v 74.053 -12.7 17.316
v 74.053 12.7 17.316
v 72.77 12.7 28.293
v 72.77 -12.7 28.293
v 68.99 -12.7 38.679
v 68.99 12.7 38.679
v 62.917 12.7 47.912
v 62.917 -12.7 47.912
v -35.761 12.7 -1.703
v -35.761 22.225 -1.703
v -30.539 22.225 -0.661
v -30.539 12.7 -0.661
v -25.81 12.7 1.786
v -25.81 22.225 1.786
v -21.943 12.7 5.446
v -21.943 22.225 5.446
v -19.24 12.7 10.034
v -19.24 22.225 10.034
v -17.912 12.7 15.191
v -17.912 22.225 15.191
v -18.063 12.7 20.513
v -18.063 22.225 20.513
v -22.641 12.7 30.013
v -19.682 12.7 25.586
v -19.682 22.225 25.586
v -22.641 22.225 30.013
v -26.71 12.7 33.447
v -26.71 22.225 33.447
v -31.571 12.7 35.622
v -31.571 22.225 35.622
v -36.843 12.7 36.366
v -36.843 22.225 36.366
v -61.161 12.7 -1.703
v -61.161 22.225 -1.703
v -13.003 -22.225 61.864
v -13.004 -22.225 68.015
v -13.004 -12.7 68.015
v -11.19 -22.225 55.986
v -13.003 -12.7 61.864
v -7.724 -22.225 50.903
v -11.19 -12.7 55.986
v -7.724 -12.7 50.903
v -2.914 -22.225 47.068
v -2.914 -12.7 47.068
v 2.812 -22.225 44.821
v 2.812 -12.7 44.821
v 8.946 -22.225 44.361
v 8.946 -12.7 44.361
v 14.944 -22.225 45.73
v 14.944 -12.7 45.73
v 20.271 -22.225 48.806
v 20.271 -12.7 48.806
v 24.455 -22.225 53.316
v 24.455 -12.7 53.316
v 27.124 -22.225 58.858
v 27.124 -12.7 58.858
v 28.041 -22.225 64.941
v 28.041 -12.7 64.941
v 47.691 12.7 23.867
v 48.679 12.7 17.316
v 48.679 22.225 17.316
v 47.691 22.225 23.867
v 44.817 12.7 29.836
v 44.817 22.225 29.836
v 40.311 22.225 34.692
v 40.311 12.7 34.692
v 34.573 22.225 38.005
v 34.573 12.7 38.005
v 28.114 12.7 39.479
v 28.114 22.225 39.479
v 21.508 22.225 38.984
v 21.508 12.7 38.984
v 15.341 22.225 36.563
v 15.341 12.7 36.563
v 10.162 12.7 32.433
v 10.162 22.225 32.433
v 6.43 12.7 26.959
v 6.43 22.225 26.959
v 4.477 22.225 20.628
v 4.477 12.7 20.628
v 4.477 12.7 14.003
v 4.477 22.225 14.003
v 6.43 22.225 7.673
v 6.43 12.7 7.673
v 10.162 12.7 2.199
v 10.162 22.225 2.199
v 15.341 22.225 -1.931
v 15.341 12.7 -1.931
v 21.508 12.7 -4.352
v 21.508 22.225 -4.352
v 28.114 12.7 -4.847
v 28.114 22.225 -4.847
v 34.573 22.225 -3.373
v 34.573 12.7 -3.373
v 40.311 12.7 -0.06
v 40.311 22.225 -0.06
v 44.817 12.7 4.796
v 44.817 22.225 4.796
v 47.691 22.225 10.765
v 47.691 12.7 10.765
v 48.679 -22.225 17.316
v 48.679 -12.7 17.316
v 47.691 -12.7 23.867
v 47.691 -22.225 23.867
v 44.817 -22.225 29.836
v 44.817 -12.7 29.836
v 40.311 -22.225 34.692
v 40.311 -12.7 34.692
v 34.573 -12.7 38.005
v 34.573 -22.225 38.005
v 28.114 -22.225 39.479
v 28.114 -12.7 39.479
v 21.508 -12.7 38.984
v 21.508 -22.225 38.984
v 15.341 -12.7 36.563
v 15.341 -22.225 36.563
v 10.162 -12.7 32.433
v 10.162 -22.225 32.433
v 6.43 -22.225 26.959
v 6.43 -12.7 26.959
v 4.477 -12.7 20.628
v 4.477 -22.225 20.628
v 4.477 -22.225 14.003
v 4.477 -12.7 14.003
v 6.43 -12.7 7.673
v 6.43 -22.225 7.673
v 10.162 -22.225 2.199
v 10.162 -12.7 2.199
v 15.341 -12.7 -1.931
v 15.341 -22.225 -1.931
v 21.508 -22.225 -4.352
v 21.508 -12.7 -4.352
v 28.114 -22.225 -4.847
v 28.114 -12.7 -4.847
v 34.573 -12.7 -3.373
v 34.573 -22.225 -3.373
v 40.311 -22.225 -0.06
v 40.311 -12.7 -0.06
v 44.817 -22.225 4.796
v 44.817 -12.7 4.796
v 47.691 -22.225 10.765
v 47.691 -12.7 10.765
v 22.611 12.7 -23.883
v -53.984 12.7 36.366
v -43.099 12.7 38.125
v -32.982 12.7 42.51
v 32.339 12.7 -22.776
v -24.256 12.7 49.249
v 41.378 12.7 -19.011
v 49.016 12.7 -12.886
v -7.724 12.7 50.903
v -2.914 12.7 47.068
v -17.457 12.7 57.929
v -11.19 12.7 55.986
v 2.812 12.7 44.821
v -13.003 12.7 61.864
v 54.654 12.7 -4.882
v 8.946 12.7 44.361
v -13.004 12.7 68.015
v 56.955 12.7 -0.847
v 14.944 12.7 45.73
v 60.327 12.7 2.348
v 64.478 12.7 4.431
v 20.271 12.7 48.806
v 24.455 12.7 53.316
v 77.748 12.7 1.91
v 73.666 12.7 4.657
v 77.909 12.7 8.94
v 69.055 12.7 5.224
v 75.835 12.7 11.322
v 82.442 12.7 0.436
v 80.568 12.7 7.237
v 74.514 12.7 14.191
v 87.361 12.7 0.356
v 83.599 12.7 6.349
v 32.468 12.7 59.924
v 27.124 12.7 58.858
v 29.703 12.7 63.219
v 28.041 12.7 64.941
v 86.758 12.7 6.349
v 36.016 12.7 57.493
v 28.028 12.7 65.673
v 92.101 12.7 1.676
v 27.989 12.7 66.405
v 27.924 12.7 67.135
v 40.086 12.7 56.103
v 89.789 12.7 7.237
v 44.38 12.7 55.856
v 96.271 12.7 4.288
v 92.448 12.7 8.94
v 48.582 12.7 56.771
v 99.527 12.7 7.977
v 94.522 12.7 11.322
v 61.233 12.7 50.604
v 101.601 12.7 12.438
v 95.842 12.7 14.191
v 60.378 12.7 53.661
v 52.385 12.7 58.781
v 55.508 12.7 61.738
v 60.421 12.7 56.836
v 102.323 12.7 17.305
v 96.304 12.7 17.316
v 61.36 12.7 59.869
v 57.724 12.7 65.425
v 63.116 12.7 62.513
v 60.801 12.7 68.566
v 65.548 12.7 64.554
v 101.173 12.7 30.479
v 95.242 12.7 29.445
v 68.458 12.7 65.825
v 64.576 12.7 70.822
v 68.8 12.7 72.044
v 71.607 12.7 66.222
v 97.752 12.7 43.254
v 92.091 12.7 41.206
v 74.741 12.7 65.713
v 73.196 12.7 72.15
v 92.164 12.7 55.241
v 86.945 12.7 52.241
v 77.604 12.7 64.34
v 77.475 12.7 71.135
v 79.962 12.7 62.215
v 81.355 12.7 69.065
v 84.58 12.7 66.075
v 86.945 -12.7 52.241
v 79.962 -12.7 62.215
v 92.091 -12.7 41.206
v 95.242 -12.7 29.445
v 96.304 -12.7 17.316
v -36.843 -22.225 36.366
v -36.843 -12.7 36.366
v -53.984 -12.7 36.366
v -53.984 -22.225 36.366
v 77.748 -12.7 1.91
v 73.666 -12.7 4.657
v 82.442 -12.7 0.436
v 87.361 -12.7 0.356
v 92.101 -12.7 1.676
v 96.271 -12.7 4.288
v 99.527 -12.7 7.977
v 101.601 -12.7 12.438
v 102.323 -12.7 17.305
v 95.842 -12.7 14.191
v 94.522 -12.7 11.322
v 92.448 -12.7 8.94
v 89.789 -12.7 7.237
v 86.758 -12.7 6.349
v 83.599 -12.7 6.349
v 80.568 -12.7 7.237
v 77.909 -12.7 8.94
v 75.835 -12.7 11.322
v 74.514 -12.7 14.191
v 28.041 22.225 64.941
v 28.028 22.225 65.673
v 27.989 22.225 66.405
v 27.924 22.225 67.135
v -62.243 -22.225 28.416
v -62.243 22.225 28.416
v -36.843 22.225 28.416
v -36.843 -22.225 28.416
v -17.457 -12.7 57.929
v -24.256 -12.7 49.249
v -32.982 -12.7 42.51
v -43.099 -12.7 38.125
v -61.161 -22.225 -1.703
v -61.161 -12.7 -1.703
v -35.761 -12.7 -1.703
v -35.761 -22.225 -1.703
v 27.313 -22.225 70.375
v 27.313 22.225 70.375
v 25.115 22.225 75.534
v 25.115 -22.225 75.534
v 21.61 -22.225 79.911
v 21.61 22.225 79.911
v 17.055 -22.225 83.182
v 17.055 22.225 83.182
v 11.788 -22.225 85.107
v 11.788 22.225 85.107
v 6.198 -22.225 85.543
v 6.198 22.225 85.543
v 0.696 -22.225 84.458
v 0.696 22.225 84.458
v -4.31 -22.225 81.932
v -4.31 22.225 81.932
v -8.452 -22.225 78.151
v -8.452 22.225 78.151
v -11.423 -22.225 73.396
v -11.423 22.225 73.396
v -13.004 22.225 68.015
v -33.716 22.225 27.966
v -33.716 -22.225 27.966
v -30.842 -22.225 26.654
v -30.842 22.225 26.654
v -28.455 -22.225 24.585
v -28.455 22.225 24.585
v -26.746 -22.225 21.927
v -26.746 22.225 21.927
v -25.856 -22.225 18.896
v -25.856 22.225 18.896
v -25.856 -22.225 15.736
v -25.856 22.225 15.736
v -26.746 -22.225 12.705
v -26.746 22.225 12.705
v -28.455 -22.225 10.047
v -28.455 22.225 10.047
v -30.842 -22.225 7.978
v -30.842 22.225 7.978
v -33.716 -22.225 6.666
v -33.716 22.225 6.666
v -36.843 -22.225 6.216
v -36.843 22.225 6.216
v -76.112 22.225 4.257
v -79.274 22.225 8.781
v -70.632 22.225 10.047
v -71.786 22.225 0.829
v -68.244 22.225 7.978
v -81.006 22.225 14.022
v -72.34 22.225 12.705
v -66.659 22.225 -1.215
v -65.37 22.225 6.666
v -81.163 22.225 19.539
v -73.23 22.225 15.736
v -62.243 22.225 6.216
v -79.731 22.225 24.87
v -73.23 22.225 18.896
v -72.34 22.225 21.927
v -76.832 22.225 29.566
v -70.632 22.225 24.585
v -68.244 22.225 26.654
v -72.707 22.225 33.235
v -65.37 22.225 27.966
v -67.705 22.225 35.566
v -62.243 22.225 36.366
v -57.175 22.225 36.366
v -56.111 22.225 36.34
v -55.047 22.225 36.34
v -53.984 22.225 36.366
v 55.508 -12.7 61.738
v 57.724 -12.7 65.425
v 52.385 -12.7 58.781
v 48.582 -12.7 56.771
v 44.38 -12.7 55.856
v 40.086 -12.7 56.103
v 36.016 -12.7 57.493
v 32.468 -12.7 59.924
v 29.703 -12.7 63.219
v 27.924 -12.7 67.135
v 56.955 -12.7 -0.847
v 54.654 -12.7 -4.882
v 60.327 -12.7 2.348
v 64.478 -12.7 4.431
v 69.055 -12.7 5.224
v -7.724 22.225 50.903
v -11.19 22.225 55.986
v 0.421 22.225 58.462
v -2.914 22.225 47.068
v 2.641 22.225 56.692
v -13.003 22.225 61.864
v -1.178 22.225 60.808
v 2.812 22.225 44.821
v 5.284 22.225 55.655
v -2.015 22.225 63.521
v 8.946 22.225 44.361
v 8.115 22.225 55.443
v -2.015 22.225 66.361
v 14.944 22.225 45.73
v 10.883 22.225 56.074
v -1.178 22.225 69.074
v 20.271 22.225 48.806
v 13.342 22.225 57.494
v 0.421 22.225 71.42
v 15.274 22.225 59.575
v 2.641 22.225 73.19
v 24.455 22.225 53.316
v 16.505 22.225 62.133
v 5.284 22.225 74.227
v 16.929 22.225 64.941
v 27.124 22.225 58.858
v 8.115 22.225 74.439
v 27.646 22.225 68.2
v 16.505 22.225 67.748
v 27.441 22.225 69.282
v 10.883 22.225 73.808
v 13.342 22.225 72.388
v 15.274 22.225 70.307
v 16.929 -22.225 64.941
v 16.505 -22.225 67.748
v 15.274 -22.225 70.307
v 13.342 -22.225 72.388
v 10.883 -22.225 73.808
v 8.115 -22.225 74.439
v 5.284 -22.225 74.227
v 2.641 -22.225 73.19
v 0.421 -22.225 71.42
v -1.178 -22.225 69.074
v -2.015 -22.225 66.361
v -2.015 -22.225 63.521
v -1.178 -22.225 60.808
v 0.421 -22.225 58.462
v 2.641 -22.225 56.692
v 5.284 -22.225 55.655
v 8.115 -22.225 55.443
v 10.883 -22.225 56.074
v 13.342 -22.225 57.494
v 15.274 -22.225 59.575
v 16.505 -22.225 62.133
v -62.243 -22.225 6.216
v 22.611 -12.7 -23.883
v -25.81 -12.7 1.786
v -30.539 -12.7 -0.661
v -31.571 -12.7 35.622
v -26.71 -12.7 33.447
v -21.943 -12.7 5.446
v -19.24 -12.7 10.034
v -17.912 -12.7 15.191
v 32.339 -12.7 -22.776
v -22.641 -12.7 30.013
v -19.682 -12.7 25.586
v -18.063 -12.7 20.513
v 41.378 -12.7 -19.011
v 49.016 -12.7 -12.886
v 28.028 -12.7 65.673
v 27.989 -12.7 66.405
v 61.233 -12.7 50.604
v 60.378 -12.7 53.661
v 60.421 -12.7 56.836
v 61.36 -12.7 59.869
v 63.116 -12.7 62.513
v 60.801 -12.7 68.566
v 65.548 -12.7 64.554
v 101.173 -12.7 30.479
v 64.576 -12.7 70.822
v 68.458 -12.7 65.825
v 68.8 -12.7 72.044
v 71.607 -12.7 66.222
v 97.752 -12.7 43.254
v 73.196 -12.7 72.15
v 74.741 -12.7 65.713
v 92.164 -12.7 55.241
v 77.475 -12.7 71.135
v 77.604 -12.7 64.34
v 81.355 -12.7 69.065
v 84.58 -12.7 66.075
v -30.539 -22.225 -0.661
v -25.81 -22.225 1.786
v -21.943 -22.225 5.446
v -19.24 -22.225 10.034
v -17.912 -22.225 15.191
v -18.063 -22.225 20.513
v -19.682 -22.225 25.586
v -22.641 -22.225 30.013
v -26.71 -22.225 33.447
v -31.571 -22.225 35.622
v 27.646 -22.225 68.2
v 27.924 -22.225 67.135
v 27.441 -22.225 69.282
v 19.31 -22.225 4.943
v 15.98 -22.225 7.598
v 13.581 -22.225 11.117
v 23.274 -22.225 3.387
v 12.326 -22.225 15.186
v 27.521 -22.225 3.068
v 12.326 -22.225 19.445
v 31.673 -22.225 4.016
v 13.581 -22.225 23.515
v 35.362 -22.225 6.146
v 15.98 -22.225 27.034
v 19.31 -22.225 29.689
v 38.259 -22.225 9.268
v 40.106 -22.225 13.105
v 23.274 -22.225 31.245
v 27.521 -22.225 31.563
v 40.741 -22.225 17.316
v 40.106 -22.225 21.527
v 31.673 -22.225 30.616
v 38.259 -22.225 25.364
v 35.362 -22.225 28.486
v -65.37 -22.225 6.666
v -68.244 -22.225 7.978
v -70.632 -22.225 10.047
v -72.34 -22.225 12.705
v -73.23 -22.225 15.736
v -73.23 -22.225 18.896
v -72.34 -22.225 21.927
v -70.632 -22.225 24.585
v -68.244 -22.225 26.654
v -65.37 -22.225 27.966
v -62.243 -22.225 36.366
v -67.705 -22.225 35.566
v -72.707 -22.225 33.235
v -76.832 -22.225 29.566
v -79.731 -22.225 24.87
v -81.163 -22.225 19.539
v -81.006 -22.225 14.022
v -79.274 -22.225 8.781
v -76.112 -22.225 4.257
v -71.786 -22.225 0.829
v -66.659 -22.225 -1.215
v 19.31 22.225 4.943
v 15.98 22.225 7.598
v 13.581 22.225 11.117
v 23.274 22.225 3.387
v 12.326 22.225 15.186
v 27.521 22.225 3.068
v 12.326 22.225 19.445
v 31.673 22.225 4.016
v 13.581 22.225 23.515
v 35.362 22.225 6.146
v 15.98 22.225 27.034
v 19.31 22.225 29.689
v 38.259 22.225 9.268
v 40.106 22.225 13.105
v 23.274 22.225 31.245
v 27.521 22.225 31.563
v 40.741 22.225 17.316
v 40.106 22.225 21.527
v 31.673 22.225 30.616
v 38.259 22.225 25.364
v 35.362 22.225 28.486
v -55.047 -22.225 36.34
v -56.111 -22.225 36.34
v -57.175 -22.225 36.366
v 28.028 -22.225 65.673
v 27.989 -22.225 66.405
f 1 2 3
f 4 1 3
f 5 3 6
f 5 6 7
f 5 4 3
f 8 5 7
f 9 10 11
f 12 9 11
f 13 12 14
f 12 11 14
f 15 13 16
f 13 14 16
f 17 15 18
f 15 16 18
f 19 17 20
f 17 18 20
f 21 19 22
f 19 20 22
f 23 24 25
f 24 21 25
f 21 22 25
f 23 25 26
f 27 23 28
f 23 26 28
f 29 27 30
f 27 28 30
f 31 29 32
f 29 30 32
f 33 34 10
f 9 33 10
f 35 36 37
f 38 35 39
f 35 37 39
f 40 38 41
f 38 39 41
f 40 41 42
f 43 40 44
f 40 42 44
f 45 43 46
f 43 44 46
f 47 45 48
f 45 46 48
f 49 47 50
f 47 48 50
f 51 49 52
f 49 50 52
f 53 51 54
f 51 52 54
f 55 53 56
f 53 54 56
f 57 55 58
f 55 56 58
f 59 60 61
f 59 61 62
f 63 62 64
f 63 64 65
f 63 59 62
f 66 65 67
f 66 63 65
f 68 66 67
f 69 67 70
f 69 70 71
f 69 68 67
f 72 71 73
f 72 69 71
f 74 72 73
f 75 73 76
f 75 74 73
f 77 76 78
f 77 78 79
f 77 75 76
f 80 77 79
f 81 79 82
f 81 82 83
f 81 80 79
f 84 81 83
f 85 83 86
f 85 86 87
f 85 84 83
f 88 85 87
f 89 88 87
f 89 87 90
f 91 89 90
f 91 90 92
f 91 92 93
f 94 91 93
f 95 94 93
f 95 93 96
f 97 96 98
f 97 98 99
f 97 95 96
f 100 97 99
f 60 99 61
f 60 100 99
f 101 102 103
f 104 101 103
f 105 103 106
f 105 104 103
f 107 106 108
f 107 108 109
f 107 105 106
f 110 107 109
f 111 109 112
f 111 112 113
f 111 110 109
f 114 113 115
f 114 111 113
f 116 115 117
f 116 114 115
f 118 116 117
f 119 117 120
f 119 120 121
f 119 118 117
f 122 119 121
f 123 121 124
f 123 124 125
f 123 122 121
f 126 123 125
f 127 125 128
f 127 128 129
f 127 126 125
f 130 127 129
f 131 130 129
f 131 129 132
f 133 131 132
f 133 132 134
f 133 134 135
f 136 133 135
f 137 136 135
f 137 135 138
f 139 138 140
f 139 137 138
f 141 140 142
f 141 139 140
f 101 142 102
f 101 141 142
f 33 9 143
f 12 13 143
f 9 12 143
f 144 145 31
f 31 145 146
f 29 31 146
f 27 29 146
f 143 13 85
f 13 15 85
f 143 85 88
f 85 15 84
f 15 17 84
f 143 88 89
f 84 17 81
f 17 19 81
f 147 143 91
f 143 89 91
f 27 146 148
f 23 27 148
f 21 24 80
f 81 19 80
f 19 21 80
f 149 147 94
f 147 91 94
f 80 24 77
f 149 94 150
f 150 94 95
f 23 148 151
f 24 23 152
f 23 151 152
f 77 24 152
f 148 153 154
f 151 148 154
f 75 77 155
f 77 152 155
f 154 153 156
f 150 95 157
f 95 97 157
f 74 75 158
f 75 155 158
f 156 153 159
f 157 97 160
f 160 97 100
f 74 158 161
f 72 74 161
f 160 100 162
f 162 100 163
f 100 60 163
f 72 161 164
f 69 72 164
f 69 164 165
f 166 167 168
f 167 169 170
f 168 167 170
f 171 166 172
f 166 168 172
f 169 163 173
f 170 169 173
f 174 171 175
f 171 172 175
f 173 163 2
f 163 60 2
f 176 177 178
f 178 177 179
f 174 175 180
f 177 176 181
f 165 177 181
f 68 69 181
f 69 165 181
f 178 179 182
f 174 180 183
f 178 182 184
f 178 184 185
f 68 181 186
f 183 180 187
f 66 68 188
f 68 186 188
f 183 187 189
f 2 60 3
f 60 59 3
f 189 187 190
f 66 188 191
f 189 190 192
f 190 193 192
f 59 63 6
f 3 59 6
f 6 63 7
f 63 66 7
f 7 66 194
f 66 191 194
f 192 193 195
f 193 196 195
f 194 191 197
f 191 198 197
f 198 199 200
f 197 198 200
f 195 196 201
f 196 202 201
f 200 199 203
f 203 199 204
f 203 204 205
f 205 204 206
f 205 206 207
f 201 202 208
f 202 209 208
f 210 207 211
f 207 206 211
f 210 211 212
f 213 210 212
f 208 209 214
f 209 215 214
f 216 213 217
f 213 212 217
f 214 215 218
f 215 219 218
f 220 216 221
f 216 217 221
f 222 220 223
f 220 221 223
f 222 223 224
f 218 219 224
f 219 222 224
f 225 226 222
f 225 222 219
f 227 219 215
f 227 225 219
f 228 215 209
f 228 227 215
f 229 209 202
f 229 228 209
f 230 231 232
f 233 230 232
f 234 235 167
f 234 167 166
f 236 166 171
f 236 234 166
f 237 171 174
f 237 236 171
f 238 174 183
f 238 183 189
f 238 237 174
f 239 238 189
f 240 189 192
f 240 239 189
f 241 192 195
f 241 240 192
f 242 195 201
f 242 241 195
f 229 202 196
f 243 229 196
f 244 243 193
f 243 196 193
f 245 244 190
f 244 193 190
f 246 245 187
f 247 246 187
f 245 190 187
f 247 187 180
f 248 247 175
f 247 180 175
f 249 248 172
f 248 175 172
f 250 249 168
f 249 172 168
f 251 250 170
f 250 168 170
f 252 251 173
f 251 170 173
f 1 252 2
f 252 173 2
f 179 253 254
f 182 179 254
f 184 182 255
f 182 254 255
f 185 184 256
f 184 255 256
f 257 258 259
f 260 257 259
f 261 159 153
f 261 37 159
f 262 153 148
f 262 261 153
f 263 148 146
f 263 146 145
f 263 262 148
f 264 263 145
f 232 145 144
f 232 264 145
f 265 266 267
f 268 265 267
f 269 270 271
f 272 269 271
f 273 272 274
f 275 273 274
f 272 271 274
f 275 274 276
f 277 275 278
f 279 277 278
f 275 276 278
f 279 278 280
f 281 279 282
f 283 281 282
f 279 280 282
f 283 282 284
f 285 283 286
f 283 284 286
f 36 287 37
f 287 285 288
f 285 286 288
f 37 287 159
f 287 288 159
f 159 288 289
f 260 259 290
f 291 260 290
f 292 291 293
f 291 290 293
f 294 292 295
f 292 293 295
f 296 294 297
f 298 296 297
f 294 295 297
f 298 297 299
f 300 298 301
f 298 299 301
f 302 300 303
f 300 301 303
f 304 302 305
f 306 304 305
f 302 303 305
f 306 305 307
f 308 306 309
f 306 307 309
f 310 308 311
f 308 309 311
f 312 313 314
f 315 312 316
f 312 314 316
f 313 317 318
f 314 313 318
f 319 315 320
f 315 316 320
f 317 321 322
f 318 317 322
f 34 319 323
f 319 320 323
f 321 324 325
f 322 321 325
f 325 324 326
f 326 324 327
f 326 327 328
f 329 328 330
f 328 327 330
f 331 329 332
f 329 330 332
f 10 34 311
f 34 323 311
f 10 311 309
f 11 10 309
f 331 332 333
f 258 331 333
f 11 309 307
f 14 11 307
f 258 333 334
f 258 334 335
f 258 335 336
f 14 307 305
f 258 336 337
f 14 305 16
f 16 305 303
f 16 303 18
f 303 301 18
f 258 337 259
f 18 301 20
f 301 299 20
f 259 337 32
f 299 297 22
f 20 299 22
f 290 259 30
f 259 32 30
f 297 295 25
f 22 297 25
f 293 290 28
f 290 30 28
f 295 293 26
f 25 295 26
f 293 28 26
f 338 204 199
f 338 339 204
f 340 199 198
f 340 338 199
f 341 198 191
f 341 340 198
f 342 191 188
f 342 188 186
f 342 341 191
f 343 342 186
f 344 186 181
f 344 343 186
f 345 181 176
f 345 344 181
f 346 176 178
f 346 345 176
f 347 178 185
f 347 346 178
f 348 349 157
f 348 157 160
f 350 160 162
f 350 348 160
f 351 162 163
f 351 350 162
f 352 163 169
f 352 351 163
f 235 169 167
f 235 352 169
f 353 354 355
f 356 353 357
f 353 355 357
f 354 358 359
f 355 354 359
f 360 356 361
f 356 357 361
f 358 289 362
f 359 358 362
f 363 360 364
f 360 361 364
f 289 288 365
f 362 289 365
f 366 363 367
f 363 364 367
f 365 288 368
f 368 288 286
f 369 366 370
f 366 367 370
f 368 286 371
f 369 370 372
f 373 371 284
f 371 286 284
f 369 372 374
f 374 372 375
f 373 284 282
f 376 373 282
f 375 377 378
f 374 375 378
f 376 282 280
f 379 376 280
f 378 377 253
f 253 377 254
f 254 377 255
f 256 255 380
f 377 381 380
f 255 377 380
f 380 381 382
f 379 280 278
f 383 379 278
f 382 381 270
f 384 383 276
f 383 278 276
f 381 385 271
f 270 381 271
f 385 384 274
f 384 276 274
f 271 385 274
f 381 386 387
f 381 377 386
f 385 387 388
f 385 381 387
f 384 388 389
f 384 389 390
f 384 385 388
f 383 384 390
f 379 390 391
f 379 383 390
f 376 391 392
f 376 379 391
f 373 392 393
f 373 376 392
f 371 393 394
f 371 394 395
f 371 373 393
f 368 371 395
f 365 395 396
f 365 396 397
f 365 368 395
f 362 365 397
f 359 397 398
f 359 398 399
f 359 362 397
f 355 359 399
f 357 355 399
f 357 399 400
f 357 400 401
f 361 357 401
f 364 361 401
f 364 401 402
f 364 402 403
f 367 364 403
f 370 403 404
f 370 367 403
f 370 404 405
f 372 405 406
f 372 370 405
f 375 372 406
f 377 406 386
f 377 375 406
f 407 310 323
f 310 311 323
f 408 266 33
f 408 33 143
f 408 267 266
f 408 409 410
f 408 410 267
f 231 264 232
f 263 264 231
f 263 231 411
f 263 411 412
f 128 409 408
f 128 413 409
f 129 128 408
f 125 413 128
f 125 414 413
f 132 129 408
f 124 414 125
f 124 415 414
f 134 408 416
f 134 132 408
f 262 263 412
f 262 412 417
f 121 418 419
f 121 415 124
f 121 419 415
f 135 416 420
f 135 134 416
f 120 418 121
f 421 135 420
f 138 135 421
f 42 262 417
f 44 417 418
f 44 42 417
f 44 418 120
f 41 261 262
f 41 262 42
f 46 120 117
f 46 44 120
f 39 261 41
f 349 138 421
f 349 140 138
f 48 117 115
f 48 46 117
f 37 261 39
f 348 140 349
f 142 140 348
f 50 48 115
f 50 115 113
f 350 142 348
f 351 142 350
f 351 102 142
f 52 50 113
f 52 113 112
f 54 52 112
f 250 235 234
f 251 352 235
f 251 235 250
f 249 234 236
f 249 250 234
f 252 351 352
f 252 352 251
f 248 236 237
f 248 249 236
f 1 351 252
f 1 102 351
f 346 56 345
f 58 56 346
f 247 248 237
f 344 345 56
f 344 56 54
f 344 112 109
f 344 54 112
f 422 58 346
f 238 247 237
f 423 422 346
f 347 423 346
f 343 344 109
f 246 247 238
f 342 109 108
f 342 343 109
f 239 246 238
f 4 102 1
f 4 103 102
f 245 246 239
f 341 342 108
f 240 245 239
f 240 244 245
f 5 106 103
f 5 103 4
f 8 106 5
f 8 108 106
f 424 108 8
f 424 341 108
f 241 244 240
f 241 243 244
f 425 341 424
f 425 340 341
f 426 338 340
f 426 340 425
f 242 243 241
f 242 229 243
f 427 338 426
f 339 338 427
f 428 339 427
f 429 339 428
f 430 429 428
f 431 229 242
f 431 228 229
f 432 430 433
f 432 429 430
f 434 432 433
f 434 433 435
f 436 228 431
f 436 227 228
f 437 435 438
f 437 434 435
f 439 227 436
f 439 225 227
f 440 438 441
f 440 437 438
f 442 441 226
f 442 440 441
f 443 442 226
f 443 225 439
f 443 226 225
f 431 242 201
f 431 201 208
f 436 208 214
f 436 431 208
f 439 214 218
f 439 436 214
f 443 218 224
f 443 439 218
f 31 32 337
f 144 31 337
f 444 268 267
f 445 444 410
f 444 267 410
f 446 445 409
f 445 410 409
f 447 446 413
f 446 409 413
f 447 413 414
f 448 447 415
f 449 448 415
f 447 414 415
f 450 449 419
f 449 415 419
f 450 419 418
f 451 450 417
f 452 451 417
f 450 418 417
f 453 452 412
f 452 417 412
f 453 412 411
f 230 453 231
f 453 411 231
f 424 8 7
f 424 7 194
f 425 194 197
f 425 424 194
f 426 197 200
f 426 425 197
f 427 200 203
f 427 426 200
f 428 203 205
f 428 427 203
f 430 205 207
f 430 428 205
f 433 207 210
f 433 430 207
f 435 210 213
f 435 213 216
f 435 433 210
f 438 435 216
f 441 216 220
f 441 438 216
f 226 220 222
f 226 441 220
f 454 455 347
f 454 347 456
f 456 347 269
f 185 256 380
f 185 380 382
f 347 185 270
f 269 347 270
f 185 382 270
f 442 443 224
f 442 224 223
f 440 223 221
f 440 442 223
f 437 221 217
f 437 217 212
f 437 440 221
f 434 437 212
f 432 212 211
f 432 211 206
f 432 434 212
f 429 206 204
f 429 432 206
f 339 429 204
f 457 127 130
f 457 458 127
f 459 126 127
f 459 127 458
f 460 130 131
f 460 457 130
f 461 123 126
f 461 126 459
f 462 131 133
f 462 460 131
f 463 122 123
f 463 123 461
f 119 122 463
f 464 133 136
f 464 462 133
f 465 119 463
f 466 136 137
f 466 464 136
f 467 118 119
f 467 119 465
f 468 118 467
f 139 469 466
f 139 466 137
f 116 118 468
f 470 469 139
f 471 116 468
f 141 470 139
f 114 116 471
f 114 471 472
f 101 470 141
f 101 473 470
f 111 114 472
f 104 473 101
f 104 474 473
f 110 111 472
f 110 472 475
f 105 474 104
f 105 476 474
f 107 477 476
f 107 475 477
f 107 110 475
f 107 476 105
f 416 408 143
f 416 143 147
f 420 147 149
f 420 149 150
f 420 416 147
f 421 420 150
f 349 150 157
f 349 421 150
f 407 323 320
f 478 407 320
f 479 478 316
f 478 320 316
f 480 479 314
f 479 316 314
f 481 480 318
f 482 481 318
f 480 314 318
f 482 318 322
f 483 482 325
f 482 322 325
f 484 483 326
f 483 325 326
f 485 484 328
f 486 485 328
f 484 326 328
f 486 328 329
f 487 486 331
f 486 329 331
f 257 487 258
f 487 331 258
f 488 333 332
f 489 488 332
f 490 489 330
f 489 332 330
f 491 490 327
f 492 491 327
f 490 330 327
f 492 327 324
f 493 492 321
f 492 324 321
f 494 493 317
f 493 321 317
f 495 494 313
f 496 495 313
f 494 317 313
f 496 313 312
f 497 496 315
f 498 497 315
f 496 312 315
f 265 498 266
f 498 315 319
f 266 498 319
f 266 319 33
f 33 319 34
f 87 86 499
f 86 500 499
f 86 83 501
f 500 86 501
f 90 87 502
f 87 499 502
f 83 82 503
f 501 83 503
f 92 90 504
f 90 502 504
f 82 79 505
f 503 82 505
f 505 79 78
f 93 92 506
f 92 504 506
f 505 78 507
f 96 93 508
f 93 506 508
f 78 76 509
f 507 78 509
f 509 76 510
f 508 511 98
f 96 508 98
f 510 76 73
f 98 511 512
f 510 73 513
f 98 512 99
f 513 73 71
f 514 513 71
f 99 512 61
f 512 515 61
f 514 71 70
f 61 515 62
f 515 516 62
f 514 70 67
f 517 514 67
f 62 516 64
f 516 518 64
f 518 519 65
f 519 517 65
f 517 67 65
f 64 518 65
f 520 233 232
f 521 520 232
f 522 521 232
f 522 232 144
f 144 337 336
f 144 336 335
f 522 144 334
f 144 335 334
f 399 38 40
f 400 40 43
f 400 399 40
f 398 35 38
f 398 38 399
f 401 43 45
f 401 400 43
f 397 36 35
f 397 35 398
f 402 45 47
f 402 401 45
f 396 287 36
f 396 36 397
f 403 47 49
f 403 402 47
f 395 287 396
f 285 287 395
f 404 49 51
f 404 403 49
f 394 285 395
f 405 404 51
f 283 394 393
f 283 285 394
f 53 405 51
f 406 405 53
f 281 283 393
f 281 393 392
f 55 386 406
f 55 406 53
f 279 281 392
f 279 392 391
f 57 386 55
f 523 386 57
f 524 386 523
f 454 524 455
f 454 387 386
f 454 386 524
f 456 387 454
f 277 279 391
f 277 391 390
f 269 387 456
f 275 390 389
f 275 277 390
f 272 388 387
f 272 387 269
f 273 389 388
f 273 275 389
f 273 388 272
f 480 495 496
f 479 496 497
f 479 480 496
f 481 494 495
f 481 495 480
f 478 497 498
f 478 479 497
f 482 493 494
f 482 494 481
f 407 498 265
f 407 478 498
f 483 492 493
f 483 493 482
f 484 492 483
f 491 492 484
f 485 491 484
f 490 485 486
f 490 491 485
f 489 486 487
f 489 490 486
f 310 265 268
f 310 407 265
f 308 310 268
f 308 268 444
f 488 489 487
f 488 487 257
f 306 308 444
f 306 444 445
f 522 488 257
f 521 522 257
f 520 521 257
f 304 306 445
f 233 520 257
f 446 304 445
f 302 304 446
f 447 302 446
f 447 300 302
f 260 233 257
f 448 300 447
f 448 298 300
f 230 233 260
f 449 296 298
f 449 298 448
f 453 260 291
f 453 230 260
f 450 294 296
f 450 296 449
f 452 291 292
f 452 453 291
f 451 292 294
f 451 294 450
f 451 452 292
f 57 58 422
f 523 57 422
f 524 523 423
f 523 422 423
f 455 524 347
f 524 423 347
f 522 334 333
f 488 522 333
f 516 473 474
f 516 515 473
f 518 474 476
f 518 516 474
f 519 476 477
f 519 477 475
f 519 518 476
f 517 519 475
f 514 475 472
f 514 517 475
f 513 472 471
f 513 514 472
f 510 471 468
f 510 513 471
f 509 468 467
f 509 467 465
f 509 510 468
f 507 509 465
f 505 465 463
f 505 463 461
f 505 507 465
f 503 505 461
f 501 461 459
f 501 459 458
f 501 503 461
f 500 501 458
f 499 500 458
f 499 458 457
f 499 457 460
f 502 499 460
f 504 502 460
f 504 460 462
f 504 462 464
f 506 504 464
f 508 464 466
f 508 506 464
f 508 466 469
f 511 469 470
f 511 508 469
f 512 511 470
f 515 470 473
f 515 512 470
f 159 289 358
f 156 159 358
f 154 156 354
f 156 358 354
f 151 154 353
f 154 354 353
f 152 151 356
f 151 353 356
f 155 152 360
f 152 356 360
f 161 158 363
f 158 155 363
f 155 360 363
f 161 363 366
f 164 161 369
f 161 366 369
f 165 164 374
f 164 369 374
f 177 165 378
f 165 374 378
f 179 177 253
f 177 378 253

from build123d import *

# Parameters (mm, degrees)
F0_R     = 22.225
F1_DEPTH = 12.7
F0_R_2   = 9.525
F0_R_3   = 14.2875
F2_DEPTH = 22.225


with BuildPart() as f1:
    # F0 (on Front) → F1 (new body, symmetric)
    with BuildSketch(Plane.XZ):
        with BuildLine():
            Line((-35.76122, -1.70331), (-61.16122, -1.70331))
            Line((-61.16122, -1.70331), (22.611454, -23.883373))
            ThreePointArc((22.611454, -23.883373), (41.377511, -19.011414), (54.653603, -4.881791))
            ThreePointArc((54.653603, -4.881791), (62.325841, 3.542555), (73.665641, 4.656909))
            ThreePointArc((73.665641, 4.656909), (92.100975, 1.676194), (102.323325, 17.304685))
            ThreePointArc((102.323325, 17.304685), (97.751671, 43.254331), (84.58042, 66.075425))
            ThreePointArc((84.58042, 66.075425), (70.994806, 72.238394), (57.723636, 65.424647))
            ThreePointArc((57.723636, 65.424647), (42.224433, 55.833223), (27.924188, 67.134716))
            ThreePointArc((27.924188, 67.134716), (28.011866, 66.039385), (28.041119, 64.940939))
            ThreePointArc((28.041119, 64.940939), (5.862071, 44.361094), (-13.003585, 68.015422))
            ThreePointArc((-13.003585, 68.015422), (-28.409448, 45.607643), (-53.983655, 36.365939))
            Line((-53.983655, 36.365939), (-36.843181, 36.365939))
            ThreePointArc((-36.843181, 36.365939), (-17.80087, 17.857139), (-35.76122, -1.70331))
        make_face()
        with Locations((26.453619, 17.315939)):
            Circle(F0_R, mode=Mode.SUBTRACT)
        with BuildLine():
            ThreePointArc((96.303526, 17.315939), (85.178419, 6.236313), (74.053312, 17.315939))
            ThreePointArc((74.053312, 17.315939), (71.1827, 33.595993), (62.9171, 47.912432))
            ThreePointArc((62.9171, 47.912432), (64.258991, 63.620822), (79.961752, 62.214594))
            ThreePointArc((79.961752, 62.214594), (92.091061, 41.206014), (96.303526, 17.315939))
        make_face(mode=Mode.SUBTRACT)
    extrude(amount=F1_DEPTH, both=True)

    # F0 (on Front) → F2 (join, symmetric)
    with BuildSketch(Plane.XZ):
        with BuildLine():
            ThreePointArc((27.312843, 70.375018), (6.197833, 85.543184), (-13.003585, 68.015422))
            ThreePointArc((-13.003585, 68.015422), (5.862071, 44.361094), (28.041119, 64.940939))
            ThreePointArc((28.041119, 64.940939), (28.011866, 66.039385), (27.924188, 67.134716))
            ThreePointArc((27.924188, 67.134716), (27.534155, 68.738951), (27.312843, 70.375018))
        make_face()
        with Locations((7.403619, 64.940939)):
            Circle(F0_R_2, mode=Mode.SUBTRACT)
        with BuildLine():
            ThreePointArc((-62.243181, 36.365939), (-81.285492, 16.77474), (-61.16122, -1.70331))
            Line((-61.16122, -1.70331), (-35.76122, -1.70331))
            ThreePointArc((-35.76122, -1.70331), (-17.80087, 17.857139), (-36.843181, 36.365939))
            Line((-36.843181, 36.365939), (-53.983655, 36.365939))
            ThreePointArc((-53.983655, 36.365939), (-55.579185, 36.337294), (-57.174716, 36.365939))
            Line((-57.174716, 36.365939), (-62.243181, 36.365939))
        make_face()
        with BuildLine():
            Line((-36.843181, 6.216139), (-62.243181, 6.216139))
            ThreePointArc((-62.243181, 6.216139), (-73.342981, 17.315939), (-62.243181, 28.415739))
            Line((-62.243181, 28.415739), (-36.843181, 28.415739))
            ThreePointArc((-36.843181, 28.415739), (-25.743381, 17.315939), (-36.843181, 6.216139))
        make_face(mode=Mode.SUBTRACT)
        with Locations((26.453619, 17.315939)):
            Circle(F0_R)
        with Locations((26.453619, 17.315939)):
            Circle(F0_R_3, mode=Mode.SUBTRACT)
    extrude(amount=F2_DEPTH, both=True)


solid = f1.part
